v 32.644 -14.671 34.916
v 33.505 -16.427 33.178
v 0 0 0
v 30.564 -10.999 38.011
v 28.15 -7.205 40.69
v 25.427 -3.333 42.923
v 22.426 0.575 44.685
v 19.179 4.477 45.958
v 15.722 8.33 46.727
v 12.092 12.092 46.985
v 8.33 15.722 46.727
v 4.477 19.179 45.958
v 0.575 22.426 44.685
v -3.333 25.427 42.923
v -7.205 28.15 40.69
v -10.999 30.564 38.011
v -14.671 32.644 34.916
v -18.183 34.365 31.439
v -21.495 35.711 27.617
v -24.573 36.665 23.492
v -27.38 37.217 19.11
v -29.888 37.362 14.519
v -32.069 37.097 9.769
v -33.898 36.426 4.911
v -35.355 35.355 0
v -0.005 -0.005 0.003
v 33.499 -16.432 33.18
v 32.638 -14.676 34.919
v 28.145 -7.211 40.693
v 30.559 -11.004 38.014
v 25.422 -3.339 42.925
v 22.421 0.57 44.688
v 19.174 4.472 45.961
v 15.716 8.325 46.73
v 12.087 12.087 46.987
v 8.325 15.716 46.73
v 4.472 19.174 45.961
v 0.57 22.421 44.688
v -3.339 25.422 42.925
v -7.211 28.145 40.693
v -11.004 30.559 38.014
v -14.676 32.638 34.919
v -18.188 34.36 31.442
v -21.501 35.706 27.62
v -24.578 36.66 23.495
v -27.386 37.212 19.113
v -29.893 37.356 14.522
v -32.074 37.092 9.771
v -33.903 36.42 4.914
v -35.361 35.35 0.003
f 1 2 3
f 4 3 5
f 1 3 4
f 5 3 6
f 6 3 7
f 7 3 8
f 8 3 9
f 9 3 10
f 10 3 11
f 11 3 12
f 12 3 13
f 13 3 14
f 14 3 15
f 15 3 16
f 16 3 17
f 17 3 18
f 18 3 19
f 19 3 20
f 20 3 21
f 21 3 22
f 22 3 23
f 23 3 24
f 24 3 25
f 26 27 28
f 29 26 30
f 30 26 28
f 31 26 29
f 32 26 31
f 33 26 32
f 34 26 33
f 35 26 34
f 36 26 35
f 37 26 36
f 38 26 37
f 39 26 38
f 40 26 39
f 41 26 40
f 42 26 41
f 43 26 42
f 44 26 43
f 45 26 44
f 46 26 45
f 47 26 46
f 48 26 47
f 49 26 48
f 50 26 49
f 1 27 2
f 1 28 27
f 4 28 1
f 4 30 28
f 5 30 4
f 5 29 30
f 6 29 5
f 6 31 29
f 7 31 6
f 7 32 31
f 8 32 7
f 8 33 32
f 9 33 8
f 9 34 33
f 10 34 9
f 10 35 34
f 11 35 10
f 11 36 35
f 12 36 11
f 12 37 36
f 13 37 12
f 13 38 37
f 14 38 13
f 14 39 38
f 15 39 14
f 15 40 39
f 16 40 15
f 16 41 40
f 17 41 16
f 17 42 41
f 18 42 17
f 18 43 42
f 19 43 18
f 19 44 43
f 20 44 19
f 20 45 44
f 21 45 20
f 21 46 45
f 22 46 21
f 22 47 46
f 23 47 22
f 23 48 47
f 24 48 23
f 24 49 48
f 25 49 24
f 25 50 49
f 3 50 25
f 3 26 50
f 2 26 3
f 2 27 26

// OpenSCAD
// file: ../utils/core/clip.scad
//
// NopSCADlib Copyright Chris Palmer 2018
// nop.head@gmail.com
// hydraraptor.blogspot.com
//
// This file is part of NopSCADlib.
//
// NopSCADlib is free software: you can redistribute it and/or modify it under the terms of the
// GNU General Public License as published by the Free Software Foundation, either version 3 of
// the License, or (at your option) any later version.
//
// NopSCADlib is distributed in the hope that it will be useful, but WITHOUT ANY WARRANTY;
// without even the implied warranty of MERCHANTABILITY or FITNESS FOR A PARTICULAR PURPOSE.
// See the GNU General Public License for more details.
//
// You should have received a copy of the GNU General Public License along with NopSCADlib.
// If not, see <https://www.gnu.org/licenses/>.
//

//
//! Construct arbirarily large box to partition 3D space and clip objects, useful for creating cross sections to see the inside when debugging.
//!
//! Original version by Doug Moen on the OpenSCAD forum
//
//
module box(xmin, ymin, zmin, xmax, ymax, zmax) //! Construct a box given its bounds
    polyhedron(
        [[xmin, ymin, zmin],  // 0
         [xmin, ymin, zmax],  // 1
         [xmin, ymax, zmin],  // 2
         [xmin, ymax, zmax],  // 3
         [xmax, ymin, zmin],  // 4
         [xmax, ymin, zmax],  // 5
         [xmax, ymax, zmin],  // 6
         [xmax, ymax, zmax]], // 7
        [[7,5,1,3],  // top
         [2,0,4,6],  // bottom
         [5,4,0,1],  // front
         [3,2,6,7],  // back
         [5,7,6,4],  // right
         [0,2,3,1]]  // left
    );

module clip(xmin = -inf, ymin = -inf, zmin = -inf, xmax = inf, ymax = inf, zmax = inf) //! Clip child to specified boundaries
    render() intersection() {
        children();

        box(xmin, ymin, zmin, xmax, ymax, zmax);
    }
// file: ../utils/core/rounded_rectangle.scad
//
// NopSCADlib Copyright Chris Palmer 2018
// nop.head@gmail.com
// hydraraptor.blogspot.com
//
// This file is part of NopSCADlib.
//
// NopSCADlib is free software: you can redistribute it and/or modify it under the terms of the
// GNU General Public License as published by the Free Software Foundation, either version 3 of
// the License, or (at your option) any later version.
//
// NopSCADlib is distributed in the hope that it will be useful, but WITHOUT ANY WARRANTY;
// without even the implied warranty of MERCHANTABILITY or FITNESS FOR A PARTICULAR PURPOSE.
// See the GNU General Public License for more details.
//
// You should have received a copy of the GNU General Public License along with NopSCADlib.
// If not, see <https://www.gnu.org/licenses/>.
//

//
//! Rectangle with rounded corners.
//
module rounded_square(size, r, center = true) //! Like ```square()``` but with with rounded corners
{
    $fn = r2sides4n(r);
    offset(r) offset(-r) square(size, center = center);
}

module rounded_rectangle(size, r, center = true, xy_center = true) //! Like ```cube()``` but corners rounded in XY plane and separate centre options for xy and z.
{
    linear_extrude(height = size[2], center = center)
        rounded_square([size[0], size[1]], r, xy_center);
}
// file: ../utils/core/teardrops.scad
//
// NopSCADlib Copyright Chris Palmer 2018
// nop.head@gmail.com
// hydraraptor.blogspot.com
//
// This file is part of NopSCADlib.
//
// NopSCADlib is free software: you can redistribute it and/or modify it under the terms of the
// GNU General Public License as published by the Free Software Foundation, either version 3 of
// the License, or (at your option) any later version.
//
// NopSCADlib is distributed in the hope that it will be useful, but WITHOUT ANY WARRANTY;
// without even the implied warranty of MERCHANTABILITY or FITNESS FOR A PARTICULAR PURPOSE.
// See the GNU General Public License for more details.
//
// You should have received a copy of the GNU General Public License along with NopSCADlib.
// If not, see <https://www.gnu.org/licenses/>.
//

//
//! For making horizontal holes that don't need support material.
//! Small holes can get away without it, but they print better with truncated teardrops.
//
module teardrop(h, r, center = true, truncate = true) //! For making horizontal holes that don't need support material, set ```truncate = false``` to make traditional RepRap teardrops that don't even need bridging
    render(convexity = 5)
        extrude_if(h, center)
           hull() {
                circle4n(r);

                if(truncate)
                    translate([0, r / 2])
                        square([2 * r * (sqrt(2) - 1), r], center = true);
                else
                    polygon([[0, 0], [eps, 0], [0, r * sqrt(2)]]);
            }

module teardrop_plus(h, r, center = true, truncate = true) //! Slightly bigger teardrop to allow for the 3D printing staircase effect
    teardrop(h, r + layer_height / 4, center, truncate);

module tearslot(h, r, w, center = true) //! A horizontal slot that doesn't need support material
    extrude_if(h, center)
        hull() {
            translate([-w/2,0,0]) teardrop(r = r, h = 0);
            translate([ w/2,0,0]) teardrop(r = r, h = 0);
        }

module vertical_tearslot(h, r, l, center = true) //! A vertical slot that doesn't need support material
    extrude_if(h, center)
        hull() {
            translate([0,  l / 2]) teardrop(0, r, true);
            translate([0, -l / 2])
                circle4n(r);
        }
// file: ../utils/core/polyholes.scad
//
// NopSCADlib Copyright Chris Palmer 2018
// nop.head@gmail.com
// hydraraptor.blogspot.com
//
// This file is part of NopSCADlib.
//
// NopSCADlib is free software: you can redistribute it and/or modify it under the terms of the
// GNU General Public License as published by the Free Software Foundation, either version 3 of
// the License, or (at your option) any later version.
//
// NopSCADlib is distributed in the hope that it will be useful, but WITHOUT ANY WARRANTY;
// without even the implied warranty of MERCHANTABILITY or FITNESS FOR A PARTICULAR PURPOSE.
// See the GNU General Public License for more details.
//
// You should have received a copy of the GNU General Public License along with NopSCADlib.
// If not, see <https://www.gnu.org/licenses/>.
//

//
//! A method of making 3D printed holes come out the right size regardless of the printer, providing
//! it gets the linear dimensions right. See <https://hydraraptor.blogspot.com/2011/02/polyholes.html>
//!
//! The module provides `poly_circle()`, `poly_cylinder()` and `poly_ring()` that is useful for making printed washers and pillars.
//
function sides(r) = max(round(4 * r), 3); //! Optimium number of sides for specified radius
function corrected_radius(r, n = 0)   = r / cos(180 / (n ? n : sides(r))); //! Adjusted radius to make flats lie on the circle
function corrected_diameter(d, n = 0) = d / cos(180 / (n ? n : sides(d / 2))); //! Adjusted diameter to make flats lie on the circle

module poly_circle(r, sides = 0) { //! Make a circle adjusted to print the correct size
    n = sides ? sides : sides(r);
    circle(r = corrected_radius(r,n), $fn = n);
}

module poly_cylinder(r, h, center = false, sides = 0) //! Make a cylinder adjusted to print the correct size
    extrude_if(h, center)
        poly_circle(r, sides);

module poly_ring(or, ir) { //! Make a 2D ring adjusted to have the correct internal radius
    cir = corrected_radius(ir);
    filaments = floor((or - cir) / extrusion_width);
    if(filaments > 3)
        difference() {
            circle(or);

            poly_circle(ir);
        }
    else
        if(filaments >= 2)
            difference() {
                offset(or - cir)
                    poly_circle(ir);

                poly_circle(ir);
            }
            else
                difference() {
                    poly_circle(or);

                    offset(-squeezed_wall)
                        poly_circle(or);
                }
}

module drill(r, h = 100) //! Make a cylinder for drilling holes suitable for CNC routing, set h = 0 for circle
    extrude_if(h)
        circle(r = corrected_radius(r, r2sides(r)));
//
// Horizontal slot
//
module slot(r, l, h = 100) //! Make a horizontal slot suitable for CNC routing, set h = 0 for 2D version
    extrude_if(h)
        hull() {
            translate([l / 2,0])
                drill(r, 0);

            translate([-l / 2,0])
                drill(r, 0);
        }
// file: ../utils/core/bom.scad
//
// NopSCADlib Copyright Chris Palmer 2018
// nop.head@gmail.com
// hydraraptor.blogspot.com
//
// This file is part of NopSCADlib.
//
// NopSCADlib is free software: you can redistribute it and/or modify it under the terms of the
// GNU General Public License as published by the Free Software Foundation, either version 3 of
// the License, or (at your option) any later version.
//
// NopSCADlib is distributed in the hope that it will be useful, but WITHOUT ANY WARRANTY;
// without even the implied warranty of MERCHANTABILITY or FITNESS FOR A PARTICULAR PURPOSE.
// See the GNU General Public License for more details.
//
// You should have received a copy of the GNU General Public License along with NopSCADlib.
// If not, see <https://www.gnu.org/licenses/>.
//

//
//! Bill Of Materials generation via echo and the ```bom.py``` script. Also handles exploded assembly views and posing. Assembly instructions can precede the module
//! definition that makes the assembly.
//!
//! The example below shows how to define a vitamin and incorporate it into an assembly with sub-assemblies and make an exploded view. The resulting flat BOM is shown but
//! heirachical BOMs are also generated for real projects.
//
function bom_mode(n = 1) = $_bom >= n && (is_undef($on_bom) || $on_bom);  //! Current BOM mode, 0 = none, 1 = printed and routed parts and assemblies, 2 includes vitamins as well
function exploded() = is_undef($exploded_parent) ? $exploded : 0;   //! Returns the value of ```$exploded``` if it is defined, else ```0```
function show_supports() = !$preview || exploded();                 //! True if printed support material should be shown

module no_explode() let($exploded_parent = true) children();        //! Prevent children being exploded
module no_pose() let($posed = true) children();                     //! Force children not to be posed even if parent is

module explode(d, explode_children = false, offset = [0,0,0]) {     //! Explode children by specified Z distance or vector ```d```, option to explode grand children
    v = is_list(d) ? d : [0, 0, d];
    o = is_list(offset) ? offset : [0, 0, offset];
    if($exploded && is_undef($exploded_parent)) {
        translate(o)                                                // Draw the line first in case the child is transparent
            hull() {
                sphere(0.2);

                translate(v * $exploded)
                    sphere(0.2);
            }

        translate(v * $exploded)
            let($exploded_parent = explode_children ? undef : true)
                children();
    }
    else
        children();
}

module pose(a = [55, 0, 25], t = [0, 0, 0], exploded = undef)       //! Pose an STL or assembly for rendering to png by specifying rotation ```a``` and translation ```t```, ```exploded = true for``` just the exploded view or ```false``` for unexploded only.
    if(is_undef($pose) || !is_undef($posed) || (!is_undef(exploded) && exploded != !!exploded()))
        children();
    else
        let($posed = true) // only pose the top level
            rotate([55, 0, 25])
                rotate([-a.x, 0, 0])
                    rotate([0, -a.y, 0])
                        rotate([0, 0, -a.z])
                            translate(-t)
                                children();


module assembly(name) {                 //! Name an assembly that will appear on the BOM, there needs to a module named ```<name>_assembly``` to make it
    if(bom_mode())
        echo(str("~", name, "_assembly{"));

    no_pose()
        if(is_undef($child_assembly))
            let($child_assembly = true)
                children();
        else
            no_explode()
                children();

    if(bom_mode())
        echo(str("~}", name, "_assembly"));
}

module stl(name) {                      //! Name an stl that will appear on the BOM, there needs to a module named ```<name>_stl``` to make it
    if(bom_mode())
        echo(str("~", name, ".stl"));
}

module dxf(name) {                      //! Name a dxf that will appear on the BOM, there needs to a module named ```<name>_dxf``` to make it
    if(bom_mode())
        echo(str("~", name, ".dxf"));
}

function value_string(value) = is_string(value) ? str("\"", value, "\"") : str(value); //! Convert ```value``` to a string or quote it if it is already a string

function arg(value, default, name = "") =   //! Create string for arg if not default, helper for ```vitamin()```
    value == default ? ""
                     : name ? str(", ", name, " = ", value_string(value))
                            : str(", ", value_string(value));

module vitamin(description) {                //! Describe a vitamin for the BOM entry and precede it with a module call that creates it, eg. "wigit(42): Type 42 widget"
    if(bom_mode(2))
        echo(str("~", description, !is_undef($hidden) ? " - not shown" : ""));
}

module not_on_bom(on = false)               //! Specify the following child parts are not on the BOM, for example when they are on a PCB that comes assembled
    let($on_bom = on)
        children();

module hidden()                             //! Make item invisible, except on the BOM
    scale(1 / sqr(1024))
        let($hidden = true)
            children();
// file: ../utils/core/sphere.scad
//
// NopSCADlib Copyright Chris Palmer 2018
// nop.head@gmail.com
// hydraraptor.blogspot.com
//
// This file is part of NopSCADlib.
//
// NopSCADlib is free software: you can redistribute it and/or modify it under the terms of the
// GNU General Public License as published by the Free Software Foundation, either version 3 of
// the License, or (at your option) any later version.
//
// NopSCADlib is distributed in the hope that it will be useful, but WITHOUT ANY WARRANTY;
// without even the implied warranty of MERCHANTABILITY or FITNESS FOR A PARTICULAR PURPOSE.
// See the GNU General Public License for more details.
//
// You should have received a copy of the GNU General Public License along with NopSCADlib.
// If not, see <https://www.gnu.org/licenses/>.
//

//! Redefines `sphere()` to always have a vertex on all six half axes I.e. vertices at the poles and the equator and `$fn` a multiple of four.
//! This ensures `hull` and `minkowski` results have the correct dimensions when spheres are placed at the corners.

module sphere(r = 1, d = undef) {                   //! Override ```sphere``` so that has vertices on all three axes. Has the advantage of giving correct dimensions when hulled
    R = is_undef(d) ? r : d / 2;
    rotate_extrude($fn = r2sides4n(R))
        rotate(-90)
            semi_circle(R);
}
// file: ../utils/core/global.scad
//
// NopSCADlib Copyright Chris Palmer 2018
// nop.head@gmail.com
// hydraraptor.blogspot.com
//
// This file is part of NopSCADlib.
//
// NopSCADlib is free software: you can redistribute it and/or modify it under the terms of the
// GNU General Public License as published by the Free Software Foundation, either version 3 of
// the License, or (at your option) any later version.
//
// NopSCADlib is distributed in the hope that it will be useful, but WITHOUT ANY WARRANTY;
// without even the implied warranty of MERCHANTABILITY or FITNESS FOR A PARTICULAR PURPOSE.
// See the GNU General Public License for more details.
//
// You should have received a copy of the GNU General Public License along with NopSCADlib.
// If not, see <https://www.gnu.org/licenses/>.
//

//
//! Global constants, functions and modules. This file is used directly or indirectly in every scad file.
//
include <../../global_defs.scad>

function sqr(x) = x * x;                                                            //! Returns the square of ```x```
function inch(x) = x * 25.4;                                                        //! Inch to mm conversion
function echoit(x) = echo(x) x;                                                     //! Echo expression and return it, useful for debugging
function in(list, x) = !!len([for(v = list) if(v == x) true]);                      //! Returns true if ```x``` is an element in the ```list```
function Len(x) = is_list(x) ? len(x) : 0;                                          //! Returns the length of a list or 0 if ```x``` is not a list
function r2sides(r) = $fn ? $fn : ceil(max(min(360/ $fa, r * 2 * PI / $fs), 5));    //! Replicates the OpenSCAD logic to calculate the number of sides from the radius
function r2sides4n(r) = floor((r2sides(r) + 3) / 4) * 4;                            //! Round up the number of sides to a multiple of 4 to ensure points land on all axes

module translate_z(z) translate([0, 0, z]) children();                              //! Shortcut for Z only translations
module vflip() rotate([180, 0, 0]) children();                                      //! Invert children by doing a 180 flip around the X axis
module ellipse(xr, yr) scale([1, yr / xr]) circle4n(xr);                            //! Draw an ellipse

module extrude_if(h, center = true)                 //! Extrudes 2D object to 3D when ```h``` is nonzero, otherwise leaves it 2D
    if(h)
        linear_extrude(height = h, center = center) // 3D
            children();
    else
        children();                                 // 2D

module circle4n(r, d = undef) {                     //! Circle with multiple of 4 vertices
    R = is_undef(d) ? r : d / 2;
    circle(R, $fn = r2sides4n(R));
}

module semi_circle(r, d = undef)                    //! A semi circle in the positive Y domain
    intersection() {
        R = is_undef(d) ? r : d / 2;
        circle4n(R);

        sq = R + 1;
        translate([-sq, 0])
            square([2 * sq, sq]);
    }

include <sphere.scad>
include <bom.scad>
include <polyholes.scad>
include <teardrops.scad>
include <rounded_rectangle.scad>
include <clip.scad>
// file: ../core.scad
//
// NopSCADlib Copyright Chris Palmer 2018
// nop.head@gmail.com
// hydraraptor.blogspot.com
//
// This file is part of NopSCADlib.
//
// NopSCADlib is free software: you can redistribute it and/or modify it under the terms of the
// GNU General Public License as published by the Free Software Foundation, either version 3 of
// the License, or (at your option) any later version.
//
// NopSCADlib is distributed in the hope that it will be useful, but WITHOUT ANY WARRANTY;
// without even the implied warranty of MERCHANTABILITY or FITNESS FOR A PARTICULAR PURPOSE.
// See the GNU General Public License for more details.
//
// You should have received a copy of the GNU General Public License along with NopSCADlib.
// If not, see <https://www.gnu.org/licenses/>.
//

//
// Include this file to use the library
//
include <global_defs.scad>
//
// Global functions and modules
//
use <utils/core/global.scad>
// file: ../utils/sector.scad
//
// NopSCADlib Copyright Chris Palmer 2018
// nop.head@gmail.com
// hydraraptor.blogspot.com
//
// This file is part of NopSCADlib.
//
// NopSCADlib is free software: you can redistribute it and/or modify it under the terms of the
// GNU General Public License as published by the Free Software Foundation, either version 3 of
// the License, or (at your option) any later version.
//
// NopSCADlib is distributed in the hope that it will be useful, but WITHOUT ANY WARRANTY;
// without even the implied warranty of MERCHANTABILITY or FITNESS FOR A PARTICULAR PURPOSE.
// See the GNU General Public License for more details.
//
// You should have received a copy of the GNU General Public License along with NopSCADlib.
// If not, see <https://www.gnu.org/licenses/>.
//

//
//! A sector of a circle between two angles.
//
include <../core.scad>

module sector(r, start_angle, end_angle) { //! Create specified sector given radius ```r```, ```start_angle``` and ```end_angle```
    R = r * sqrt(2) + 1;

    if(end_angle > start_angle)
        intersection() {
            circle4n(r);

            // A 4 triangle fan
            polygon([[0, 0],
                     for(i = [0 : 4], a = start_angle + i * (end_angle - start_angle) / 4) R * [cos(a), sin(a)] ]);
        }
}
// file: ../global_defs.scad
//
// NopSCADlib Copyright Chris Palmer 2018
// nop.head@gmail.com
// hydraraptor.blogspot.com
//
// This file is part of NopSCADlib.
//
// NopSCADlib is free software: you can redistribute it and/or modify it under the terms of the
// GNU General Public License as published by the Free Software Foundation, either version 3 of
// the License, or (at your option) any later version.
//
// NopSCADlib is distributed in the hope that it will be useful, but WITHOUT ANY WARRANTY;
// without even the implied warranty of MERCHANTABILITY or FITNESS FOR A PARTICULAR PURPOSE.
// See the GNU General Public License for more details.
//
// You should have received a copy of the GNU General Public License along with NopSCADlib.
// If not, see <https://www.gnu.org/licenses/>.
//

//
// This file included directly or indirectly in every scad file.
//
// This scheme allows the following:
//  bom defaults to 0
//  Setting $bom on the command line or in the main file before including lib.scad overrides it everywhere.
//  Setting $bom after including lib overrides bom in the libs but not in the local file.
//  Setting $_bom in the local file overrides it in the local file but not in the libs.
//
//function is_undef(x) = x == undef;

$_bom           = is_undef($bom)             ? 0      : $bom;             // 0 no bom, 1 assemblies and stls, 2 vitamins as well
$exploded       = is_undef($explode)         ? 0      : $explode;         // 1 for exploded view
layer_height    = is_undef($layer_height)    ? 0.25   : $layer_height;    // layer heigth when printing
extrusion_width = is_undef($extrusion_width) ? 0.5    : $extrusion_width; // filament width when printing
nozzle          = is_undef($nozzle)          ? 0.45   : $nozzle;          // 3D printer nozzle
cnc_bit_r       = is_undef($cnc_bit_r)       ? 1.2    : $cnc_bit_r;       // miniumum tool radius when milling 2D objects
pp1_colour      = is_undef($pp1_colour)      ? "lime" : $pp1_colour;      // printed part colour 1
pp2_colour      = is_undef($pp2_colour)      ? "red"  : $pp2_colour;      // printed part colour 2
pp3_colour      = is_undef($pp3_colour)      ? "blue" : $pp3_colour;      // printed part colour 3
pp4_colour      = is_undef($pp4_colour)      ? "darkorange" : $pp4_colour;// printed part colour 4
show_rays       = is_undef($show_rays)       ? false  : $show_rays;       // show camera sight lines and light direction

// Minimum wall is about two filaments wide but we extrude it closer to get better bonding
squeezed_wall = $preview ? 2 * extrusion_width - layer_height * (1 - PI / 4)
                         : extrusion_width - layer_height / 2 + nozzle / 2 + extrusion_width / 2;

inf = 1e10;      // very big
eps = 1/128;     // small fudge factor to stop CSG barfing on coincident faces.
$fa = 6;
$fs = extrusion_width / 2;

function round_to_layer(z) = ceil(z / layer_height) * layer_height;
// Some additional named colors
grey20                          = [0.2, 0.2, 0.2];
grey30                          = [0.3, 0.3, 0.3];
grey40                          = [0.4, 0.4, 0.4];
grey50                          = [0.5, 0.5, 0.5];
grey60                          = [0.6, 0.6, 0.6];
grey70                          = [0.7, 0.7, 0.7];
grey80                          = [0.8, 0.8, 0.8];
grey90                          = [0.9, 0.9, 0.9];
brass                           = "gold";

/*
 * Enums
 */
//
// Screws
//
hs_cap    = 0;
hs_pan    = 1;
hs_cs     = 2;     // counter sunk
hs_hex    = 3;
hs_grub   = 4;     // pulley set screw
hs_cs_cap = 5;
hs_dome   = 6;
//
// Hot end descriptions
//
jhead   = 1;
e3d     = 2;
//
// Face enumeration
//
f_bottom = 0;
f_top    = 1;
f_left   = 2;
f_right  = 3;
f_front  = 4;
f_back   = 5;
// main file
//
// NopSCADlib Copyright Chris Palmer 2018
// nop.head@gmail.com
// hydraraptor.blogspot.com
//
// This file is part of NopSCADlib.
//
// NopSCADlib is free software: you can redistribute it and/or modify it under the terms of the
// GNU General Public License as published by the Free Software Foundation, either version 3 of
// the License, or (at your option) any later version.
//
// NopSCADlib is distributed in the hope that it will be useful, but WITHOUT ANY WARRANTY;
// without even the implied warranty of MERCHANTABILITY or FITNESS FOR A PARTICULAR PURPOSE.
// See the GNU General Public License for more details.
//
// You should have received a copy of the GNU General Public License along with NopSCADlib.
// If not, see <https://www.gnu.org/licenses/>.
//

include <../global_defs.scad>
use <../utils/sector.scad>


module sectors() {
    linear_extrude(height = eps)
        sector(50, 45, 180);
}

rotate([70, 0, 315]) sectors();
